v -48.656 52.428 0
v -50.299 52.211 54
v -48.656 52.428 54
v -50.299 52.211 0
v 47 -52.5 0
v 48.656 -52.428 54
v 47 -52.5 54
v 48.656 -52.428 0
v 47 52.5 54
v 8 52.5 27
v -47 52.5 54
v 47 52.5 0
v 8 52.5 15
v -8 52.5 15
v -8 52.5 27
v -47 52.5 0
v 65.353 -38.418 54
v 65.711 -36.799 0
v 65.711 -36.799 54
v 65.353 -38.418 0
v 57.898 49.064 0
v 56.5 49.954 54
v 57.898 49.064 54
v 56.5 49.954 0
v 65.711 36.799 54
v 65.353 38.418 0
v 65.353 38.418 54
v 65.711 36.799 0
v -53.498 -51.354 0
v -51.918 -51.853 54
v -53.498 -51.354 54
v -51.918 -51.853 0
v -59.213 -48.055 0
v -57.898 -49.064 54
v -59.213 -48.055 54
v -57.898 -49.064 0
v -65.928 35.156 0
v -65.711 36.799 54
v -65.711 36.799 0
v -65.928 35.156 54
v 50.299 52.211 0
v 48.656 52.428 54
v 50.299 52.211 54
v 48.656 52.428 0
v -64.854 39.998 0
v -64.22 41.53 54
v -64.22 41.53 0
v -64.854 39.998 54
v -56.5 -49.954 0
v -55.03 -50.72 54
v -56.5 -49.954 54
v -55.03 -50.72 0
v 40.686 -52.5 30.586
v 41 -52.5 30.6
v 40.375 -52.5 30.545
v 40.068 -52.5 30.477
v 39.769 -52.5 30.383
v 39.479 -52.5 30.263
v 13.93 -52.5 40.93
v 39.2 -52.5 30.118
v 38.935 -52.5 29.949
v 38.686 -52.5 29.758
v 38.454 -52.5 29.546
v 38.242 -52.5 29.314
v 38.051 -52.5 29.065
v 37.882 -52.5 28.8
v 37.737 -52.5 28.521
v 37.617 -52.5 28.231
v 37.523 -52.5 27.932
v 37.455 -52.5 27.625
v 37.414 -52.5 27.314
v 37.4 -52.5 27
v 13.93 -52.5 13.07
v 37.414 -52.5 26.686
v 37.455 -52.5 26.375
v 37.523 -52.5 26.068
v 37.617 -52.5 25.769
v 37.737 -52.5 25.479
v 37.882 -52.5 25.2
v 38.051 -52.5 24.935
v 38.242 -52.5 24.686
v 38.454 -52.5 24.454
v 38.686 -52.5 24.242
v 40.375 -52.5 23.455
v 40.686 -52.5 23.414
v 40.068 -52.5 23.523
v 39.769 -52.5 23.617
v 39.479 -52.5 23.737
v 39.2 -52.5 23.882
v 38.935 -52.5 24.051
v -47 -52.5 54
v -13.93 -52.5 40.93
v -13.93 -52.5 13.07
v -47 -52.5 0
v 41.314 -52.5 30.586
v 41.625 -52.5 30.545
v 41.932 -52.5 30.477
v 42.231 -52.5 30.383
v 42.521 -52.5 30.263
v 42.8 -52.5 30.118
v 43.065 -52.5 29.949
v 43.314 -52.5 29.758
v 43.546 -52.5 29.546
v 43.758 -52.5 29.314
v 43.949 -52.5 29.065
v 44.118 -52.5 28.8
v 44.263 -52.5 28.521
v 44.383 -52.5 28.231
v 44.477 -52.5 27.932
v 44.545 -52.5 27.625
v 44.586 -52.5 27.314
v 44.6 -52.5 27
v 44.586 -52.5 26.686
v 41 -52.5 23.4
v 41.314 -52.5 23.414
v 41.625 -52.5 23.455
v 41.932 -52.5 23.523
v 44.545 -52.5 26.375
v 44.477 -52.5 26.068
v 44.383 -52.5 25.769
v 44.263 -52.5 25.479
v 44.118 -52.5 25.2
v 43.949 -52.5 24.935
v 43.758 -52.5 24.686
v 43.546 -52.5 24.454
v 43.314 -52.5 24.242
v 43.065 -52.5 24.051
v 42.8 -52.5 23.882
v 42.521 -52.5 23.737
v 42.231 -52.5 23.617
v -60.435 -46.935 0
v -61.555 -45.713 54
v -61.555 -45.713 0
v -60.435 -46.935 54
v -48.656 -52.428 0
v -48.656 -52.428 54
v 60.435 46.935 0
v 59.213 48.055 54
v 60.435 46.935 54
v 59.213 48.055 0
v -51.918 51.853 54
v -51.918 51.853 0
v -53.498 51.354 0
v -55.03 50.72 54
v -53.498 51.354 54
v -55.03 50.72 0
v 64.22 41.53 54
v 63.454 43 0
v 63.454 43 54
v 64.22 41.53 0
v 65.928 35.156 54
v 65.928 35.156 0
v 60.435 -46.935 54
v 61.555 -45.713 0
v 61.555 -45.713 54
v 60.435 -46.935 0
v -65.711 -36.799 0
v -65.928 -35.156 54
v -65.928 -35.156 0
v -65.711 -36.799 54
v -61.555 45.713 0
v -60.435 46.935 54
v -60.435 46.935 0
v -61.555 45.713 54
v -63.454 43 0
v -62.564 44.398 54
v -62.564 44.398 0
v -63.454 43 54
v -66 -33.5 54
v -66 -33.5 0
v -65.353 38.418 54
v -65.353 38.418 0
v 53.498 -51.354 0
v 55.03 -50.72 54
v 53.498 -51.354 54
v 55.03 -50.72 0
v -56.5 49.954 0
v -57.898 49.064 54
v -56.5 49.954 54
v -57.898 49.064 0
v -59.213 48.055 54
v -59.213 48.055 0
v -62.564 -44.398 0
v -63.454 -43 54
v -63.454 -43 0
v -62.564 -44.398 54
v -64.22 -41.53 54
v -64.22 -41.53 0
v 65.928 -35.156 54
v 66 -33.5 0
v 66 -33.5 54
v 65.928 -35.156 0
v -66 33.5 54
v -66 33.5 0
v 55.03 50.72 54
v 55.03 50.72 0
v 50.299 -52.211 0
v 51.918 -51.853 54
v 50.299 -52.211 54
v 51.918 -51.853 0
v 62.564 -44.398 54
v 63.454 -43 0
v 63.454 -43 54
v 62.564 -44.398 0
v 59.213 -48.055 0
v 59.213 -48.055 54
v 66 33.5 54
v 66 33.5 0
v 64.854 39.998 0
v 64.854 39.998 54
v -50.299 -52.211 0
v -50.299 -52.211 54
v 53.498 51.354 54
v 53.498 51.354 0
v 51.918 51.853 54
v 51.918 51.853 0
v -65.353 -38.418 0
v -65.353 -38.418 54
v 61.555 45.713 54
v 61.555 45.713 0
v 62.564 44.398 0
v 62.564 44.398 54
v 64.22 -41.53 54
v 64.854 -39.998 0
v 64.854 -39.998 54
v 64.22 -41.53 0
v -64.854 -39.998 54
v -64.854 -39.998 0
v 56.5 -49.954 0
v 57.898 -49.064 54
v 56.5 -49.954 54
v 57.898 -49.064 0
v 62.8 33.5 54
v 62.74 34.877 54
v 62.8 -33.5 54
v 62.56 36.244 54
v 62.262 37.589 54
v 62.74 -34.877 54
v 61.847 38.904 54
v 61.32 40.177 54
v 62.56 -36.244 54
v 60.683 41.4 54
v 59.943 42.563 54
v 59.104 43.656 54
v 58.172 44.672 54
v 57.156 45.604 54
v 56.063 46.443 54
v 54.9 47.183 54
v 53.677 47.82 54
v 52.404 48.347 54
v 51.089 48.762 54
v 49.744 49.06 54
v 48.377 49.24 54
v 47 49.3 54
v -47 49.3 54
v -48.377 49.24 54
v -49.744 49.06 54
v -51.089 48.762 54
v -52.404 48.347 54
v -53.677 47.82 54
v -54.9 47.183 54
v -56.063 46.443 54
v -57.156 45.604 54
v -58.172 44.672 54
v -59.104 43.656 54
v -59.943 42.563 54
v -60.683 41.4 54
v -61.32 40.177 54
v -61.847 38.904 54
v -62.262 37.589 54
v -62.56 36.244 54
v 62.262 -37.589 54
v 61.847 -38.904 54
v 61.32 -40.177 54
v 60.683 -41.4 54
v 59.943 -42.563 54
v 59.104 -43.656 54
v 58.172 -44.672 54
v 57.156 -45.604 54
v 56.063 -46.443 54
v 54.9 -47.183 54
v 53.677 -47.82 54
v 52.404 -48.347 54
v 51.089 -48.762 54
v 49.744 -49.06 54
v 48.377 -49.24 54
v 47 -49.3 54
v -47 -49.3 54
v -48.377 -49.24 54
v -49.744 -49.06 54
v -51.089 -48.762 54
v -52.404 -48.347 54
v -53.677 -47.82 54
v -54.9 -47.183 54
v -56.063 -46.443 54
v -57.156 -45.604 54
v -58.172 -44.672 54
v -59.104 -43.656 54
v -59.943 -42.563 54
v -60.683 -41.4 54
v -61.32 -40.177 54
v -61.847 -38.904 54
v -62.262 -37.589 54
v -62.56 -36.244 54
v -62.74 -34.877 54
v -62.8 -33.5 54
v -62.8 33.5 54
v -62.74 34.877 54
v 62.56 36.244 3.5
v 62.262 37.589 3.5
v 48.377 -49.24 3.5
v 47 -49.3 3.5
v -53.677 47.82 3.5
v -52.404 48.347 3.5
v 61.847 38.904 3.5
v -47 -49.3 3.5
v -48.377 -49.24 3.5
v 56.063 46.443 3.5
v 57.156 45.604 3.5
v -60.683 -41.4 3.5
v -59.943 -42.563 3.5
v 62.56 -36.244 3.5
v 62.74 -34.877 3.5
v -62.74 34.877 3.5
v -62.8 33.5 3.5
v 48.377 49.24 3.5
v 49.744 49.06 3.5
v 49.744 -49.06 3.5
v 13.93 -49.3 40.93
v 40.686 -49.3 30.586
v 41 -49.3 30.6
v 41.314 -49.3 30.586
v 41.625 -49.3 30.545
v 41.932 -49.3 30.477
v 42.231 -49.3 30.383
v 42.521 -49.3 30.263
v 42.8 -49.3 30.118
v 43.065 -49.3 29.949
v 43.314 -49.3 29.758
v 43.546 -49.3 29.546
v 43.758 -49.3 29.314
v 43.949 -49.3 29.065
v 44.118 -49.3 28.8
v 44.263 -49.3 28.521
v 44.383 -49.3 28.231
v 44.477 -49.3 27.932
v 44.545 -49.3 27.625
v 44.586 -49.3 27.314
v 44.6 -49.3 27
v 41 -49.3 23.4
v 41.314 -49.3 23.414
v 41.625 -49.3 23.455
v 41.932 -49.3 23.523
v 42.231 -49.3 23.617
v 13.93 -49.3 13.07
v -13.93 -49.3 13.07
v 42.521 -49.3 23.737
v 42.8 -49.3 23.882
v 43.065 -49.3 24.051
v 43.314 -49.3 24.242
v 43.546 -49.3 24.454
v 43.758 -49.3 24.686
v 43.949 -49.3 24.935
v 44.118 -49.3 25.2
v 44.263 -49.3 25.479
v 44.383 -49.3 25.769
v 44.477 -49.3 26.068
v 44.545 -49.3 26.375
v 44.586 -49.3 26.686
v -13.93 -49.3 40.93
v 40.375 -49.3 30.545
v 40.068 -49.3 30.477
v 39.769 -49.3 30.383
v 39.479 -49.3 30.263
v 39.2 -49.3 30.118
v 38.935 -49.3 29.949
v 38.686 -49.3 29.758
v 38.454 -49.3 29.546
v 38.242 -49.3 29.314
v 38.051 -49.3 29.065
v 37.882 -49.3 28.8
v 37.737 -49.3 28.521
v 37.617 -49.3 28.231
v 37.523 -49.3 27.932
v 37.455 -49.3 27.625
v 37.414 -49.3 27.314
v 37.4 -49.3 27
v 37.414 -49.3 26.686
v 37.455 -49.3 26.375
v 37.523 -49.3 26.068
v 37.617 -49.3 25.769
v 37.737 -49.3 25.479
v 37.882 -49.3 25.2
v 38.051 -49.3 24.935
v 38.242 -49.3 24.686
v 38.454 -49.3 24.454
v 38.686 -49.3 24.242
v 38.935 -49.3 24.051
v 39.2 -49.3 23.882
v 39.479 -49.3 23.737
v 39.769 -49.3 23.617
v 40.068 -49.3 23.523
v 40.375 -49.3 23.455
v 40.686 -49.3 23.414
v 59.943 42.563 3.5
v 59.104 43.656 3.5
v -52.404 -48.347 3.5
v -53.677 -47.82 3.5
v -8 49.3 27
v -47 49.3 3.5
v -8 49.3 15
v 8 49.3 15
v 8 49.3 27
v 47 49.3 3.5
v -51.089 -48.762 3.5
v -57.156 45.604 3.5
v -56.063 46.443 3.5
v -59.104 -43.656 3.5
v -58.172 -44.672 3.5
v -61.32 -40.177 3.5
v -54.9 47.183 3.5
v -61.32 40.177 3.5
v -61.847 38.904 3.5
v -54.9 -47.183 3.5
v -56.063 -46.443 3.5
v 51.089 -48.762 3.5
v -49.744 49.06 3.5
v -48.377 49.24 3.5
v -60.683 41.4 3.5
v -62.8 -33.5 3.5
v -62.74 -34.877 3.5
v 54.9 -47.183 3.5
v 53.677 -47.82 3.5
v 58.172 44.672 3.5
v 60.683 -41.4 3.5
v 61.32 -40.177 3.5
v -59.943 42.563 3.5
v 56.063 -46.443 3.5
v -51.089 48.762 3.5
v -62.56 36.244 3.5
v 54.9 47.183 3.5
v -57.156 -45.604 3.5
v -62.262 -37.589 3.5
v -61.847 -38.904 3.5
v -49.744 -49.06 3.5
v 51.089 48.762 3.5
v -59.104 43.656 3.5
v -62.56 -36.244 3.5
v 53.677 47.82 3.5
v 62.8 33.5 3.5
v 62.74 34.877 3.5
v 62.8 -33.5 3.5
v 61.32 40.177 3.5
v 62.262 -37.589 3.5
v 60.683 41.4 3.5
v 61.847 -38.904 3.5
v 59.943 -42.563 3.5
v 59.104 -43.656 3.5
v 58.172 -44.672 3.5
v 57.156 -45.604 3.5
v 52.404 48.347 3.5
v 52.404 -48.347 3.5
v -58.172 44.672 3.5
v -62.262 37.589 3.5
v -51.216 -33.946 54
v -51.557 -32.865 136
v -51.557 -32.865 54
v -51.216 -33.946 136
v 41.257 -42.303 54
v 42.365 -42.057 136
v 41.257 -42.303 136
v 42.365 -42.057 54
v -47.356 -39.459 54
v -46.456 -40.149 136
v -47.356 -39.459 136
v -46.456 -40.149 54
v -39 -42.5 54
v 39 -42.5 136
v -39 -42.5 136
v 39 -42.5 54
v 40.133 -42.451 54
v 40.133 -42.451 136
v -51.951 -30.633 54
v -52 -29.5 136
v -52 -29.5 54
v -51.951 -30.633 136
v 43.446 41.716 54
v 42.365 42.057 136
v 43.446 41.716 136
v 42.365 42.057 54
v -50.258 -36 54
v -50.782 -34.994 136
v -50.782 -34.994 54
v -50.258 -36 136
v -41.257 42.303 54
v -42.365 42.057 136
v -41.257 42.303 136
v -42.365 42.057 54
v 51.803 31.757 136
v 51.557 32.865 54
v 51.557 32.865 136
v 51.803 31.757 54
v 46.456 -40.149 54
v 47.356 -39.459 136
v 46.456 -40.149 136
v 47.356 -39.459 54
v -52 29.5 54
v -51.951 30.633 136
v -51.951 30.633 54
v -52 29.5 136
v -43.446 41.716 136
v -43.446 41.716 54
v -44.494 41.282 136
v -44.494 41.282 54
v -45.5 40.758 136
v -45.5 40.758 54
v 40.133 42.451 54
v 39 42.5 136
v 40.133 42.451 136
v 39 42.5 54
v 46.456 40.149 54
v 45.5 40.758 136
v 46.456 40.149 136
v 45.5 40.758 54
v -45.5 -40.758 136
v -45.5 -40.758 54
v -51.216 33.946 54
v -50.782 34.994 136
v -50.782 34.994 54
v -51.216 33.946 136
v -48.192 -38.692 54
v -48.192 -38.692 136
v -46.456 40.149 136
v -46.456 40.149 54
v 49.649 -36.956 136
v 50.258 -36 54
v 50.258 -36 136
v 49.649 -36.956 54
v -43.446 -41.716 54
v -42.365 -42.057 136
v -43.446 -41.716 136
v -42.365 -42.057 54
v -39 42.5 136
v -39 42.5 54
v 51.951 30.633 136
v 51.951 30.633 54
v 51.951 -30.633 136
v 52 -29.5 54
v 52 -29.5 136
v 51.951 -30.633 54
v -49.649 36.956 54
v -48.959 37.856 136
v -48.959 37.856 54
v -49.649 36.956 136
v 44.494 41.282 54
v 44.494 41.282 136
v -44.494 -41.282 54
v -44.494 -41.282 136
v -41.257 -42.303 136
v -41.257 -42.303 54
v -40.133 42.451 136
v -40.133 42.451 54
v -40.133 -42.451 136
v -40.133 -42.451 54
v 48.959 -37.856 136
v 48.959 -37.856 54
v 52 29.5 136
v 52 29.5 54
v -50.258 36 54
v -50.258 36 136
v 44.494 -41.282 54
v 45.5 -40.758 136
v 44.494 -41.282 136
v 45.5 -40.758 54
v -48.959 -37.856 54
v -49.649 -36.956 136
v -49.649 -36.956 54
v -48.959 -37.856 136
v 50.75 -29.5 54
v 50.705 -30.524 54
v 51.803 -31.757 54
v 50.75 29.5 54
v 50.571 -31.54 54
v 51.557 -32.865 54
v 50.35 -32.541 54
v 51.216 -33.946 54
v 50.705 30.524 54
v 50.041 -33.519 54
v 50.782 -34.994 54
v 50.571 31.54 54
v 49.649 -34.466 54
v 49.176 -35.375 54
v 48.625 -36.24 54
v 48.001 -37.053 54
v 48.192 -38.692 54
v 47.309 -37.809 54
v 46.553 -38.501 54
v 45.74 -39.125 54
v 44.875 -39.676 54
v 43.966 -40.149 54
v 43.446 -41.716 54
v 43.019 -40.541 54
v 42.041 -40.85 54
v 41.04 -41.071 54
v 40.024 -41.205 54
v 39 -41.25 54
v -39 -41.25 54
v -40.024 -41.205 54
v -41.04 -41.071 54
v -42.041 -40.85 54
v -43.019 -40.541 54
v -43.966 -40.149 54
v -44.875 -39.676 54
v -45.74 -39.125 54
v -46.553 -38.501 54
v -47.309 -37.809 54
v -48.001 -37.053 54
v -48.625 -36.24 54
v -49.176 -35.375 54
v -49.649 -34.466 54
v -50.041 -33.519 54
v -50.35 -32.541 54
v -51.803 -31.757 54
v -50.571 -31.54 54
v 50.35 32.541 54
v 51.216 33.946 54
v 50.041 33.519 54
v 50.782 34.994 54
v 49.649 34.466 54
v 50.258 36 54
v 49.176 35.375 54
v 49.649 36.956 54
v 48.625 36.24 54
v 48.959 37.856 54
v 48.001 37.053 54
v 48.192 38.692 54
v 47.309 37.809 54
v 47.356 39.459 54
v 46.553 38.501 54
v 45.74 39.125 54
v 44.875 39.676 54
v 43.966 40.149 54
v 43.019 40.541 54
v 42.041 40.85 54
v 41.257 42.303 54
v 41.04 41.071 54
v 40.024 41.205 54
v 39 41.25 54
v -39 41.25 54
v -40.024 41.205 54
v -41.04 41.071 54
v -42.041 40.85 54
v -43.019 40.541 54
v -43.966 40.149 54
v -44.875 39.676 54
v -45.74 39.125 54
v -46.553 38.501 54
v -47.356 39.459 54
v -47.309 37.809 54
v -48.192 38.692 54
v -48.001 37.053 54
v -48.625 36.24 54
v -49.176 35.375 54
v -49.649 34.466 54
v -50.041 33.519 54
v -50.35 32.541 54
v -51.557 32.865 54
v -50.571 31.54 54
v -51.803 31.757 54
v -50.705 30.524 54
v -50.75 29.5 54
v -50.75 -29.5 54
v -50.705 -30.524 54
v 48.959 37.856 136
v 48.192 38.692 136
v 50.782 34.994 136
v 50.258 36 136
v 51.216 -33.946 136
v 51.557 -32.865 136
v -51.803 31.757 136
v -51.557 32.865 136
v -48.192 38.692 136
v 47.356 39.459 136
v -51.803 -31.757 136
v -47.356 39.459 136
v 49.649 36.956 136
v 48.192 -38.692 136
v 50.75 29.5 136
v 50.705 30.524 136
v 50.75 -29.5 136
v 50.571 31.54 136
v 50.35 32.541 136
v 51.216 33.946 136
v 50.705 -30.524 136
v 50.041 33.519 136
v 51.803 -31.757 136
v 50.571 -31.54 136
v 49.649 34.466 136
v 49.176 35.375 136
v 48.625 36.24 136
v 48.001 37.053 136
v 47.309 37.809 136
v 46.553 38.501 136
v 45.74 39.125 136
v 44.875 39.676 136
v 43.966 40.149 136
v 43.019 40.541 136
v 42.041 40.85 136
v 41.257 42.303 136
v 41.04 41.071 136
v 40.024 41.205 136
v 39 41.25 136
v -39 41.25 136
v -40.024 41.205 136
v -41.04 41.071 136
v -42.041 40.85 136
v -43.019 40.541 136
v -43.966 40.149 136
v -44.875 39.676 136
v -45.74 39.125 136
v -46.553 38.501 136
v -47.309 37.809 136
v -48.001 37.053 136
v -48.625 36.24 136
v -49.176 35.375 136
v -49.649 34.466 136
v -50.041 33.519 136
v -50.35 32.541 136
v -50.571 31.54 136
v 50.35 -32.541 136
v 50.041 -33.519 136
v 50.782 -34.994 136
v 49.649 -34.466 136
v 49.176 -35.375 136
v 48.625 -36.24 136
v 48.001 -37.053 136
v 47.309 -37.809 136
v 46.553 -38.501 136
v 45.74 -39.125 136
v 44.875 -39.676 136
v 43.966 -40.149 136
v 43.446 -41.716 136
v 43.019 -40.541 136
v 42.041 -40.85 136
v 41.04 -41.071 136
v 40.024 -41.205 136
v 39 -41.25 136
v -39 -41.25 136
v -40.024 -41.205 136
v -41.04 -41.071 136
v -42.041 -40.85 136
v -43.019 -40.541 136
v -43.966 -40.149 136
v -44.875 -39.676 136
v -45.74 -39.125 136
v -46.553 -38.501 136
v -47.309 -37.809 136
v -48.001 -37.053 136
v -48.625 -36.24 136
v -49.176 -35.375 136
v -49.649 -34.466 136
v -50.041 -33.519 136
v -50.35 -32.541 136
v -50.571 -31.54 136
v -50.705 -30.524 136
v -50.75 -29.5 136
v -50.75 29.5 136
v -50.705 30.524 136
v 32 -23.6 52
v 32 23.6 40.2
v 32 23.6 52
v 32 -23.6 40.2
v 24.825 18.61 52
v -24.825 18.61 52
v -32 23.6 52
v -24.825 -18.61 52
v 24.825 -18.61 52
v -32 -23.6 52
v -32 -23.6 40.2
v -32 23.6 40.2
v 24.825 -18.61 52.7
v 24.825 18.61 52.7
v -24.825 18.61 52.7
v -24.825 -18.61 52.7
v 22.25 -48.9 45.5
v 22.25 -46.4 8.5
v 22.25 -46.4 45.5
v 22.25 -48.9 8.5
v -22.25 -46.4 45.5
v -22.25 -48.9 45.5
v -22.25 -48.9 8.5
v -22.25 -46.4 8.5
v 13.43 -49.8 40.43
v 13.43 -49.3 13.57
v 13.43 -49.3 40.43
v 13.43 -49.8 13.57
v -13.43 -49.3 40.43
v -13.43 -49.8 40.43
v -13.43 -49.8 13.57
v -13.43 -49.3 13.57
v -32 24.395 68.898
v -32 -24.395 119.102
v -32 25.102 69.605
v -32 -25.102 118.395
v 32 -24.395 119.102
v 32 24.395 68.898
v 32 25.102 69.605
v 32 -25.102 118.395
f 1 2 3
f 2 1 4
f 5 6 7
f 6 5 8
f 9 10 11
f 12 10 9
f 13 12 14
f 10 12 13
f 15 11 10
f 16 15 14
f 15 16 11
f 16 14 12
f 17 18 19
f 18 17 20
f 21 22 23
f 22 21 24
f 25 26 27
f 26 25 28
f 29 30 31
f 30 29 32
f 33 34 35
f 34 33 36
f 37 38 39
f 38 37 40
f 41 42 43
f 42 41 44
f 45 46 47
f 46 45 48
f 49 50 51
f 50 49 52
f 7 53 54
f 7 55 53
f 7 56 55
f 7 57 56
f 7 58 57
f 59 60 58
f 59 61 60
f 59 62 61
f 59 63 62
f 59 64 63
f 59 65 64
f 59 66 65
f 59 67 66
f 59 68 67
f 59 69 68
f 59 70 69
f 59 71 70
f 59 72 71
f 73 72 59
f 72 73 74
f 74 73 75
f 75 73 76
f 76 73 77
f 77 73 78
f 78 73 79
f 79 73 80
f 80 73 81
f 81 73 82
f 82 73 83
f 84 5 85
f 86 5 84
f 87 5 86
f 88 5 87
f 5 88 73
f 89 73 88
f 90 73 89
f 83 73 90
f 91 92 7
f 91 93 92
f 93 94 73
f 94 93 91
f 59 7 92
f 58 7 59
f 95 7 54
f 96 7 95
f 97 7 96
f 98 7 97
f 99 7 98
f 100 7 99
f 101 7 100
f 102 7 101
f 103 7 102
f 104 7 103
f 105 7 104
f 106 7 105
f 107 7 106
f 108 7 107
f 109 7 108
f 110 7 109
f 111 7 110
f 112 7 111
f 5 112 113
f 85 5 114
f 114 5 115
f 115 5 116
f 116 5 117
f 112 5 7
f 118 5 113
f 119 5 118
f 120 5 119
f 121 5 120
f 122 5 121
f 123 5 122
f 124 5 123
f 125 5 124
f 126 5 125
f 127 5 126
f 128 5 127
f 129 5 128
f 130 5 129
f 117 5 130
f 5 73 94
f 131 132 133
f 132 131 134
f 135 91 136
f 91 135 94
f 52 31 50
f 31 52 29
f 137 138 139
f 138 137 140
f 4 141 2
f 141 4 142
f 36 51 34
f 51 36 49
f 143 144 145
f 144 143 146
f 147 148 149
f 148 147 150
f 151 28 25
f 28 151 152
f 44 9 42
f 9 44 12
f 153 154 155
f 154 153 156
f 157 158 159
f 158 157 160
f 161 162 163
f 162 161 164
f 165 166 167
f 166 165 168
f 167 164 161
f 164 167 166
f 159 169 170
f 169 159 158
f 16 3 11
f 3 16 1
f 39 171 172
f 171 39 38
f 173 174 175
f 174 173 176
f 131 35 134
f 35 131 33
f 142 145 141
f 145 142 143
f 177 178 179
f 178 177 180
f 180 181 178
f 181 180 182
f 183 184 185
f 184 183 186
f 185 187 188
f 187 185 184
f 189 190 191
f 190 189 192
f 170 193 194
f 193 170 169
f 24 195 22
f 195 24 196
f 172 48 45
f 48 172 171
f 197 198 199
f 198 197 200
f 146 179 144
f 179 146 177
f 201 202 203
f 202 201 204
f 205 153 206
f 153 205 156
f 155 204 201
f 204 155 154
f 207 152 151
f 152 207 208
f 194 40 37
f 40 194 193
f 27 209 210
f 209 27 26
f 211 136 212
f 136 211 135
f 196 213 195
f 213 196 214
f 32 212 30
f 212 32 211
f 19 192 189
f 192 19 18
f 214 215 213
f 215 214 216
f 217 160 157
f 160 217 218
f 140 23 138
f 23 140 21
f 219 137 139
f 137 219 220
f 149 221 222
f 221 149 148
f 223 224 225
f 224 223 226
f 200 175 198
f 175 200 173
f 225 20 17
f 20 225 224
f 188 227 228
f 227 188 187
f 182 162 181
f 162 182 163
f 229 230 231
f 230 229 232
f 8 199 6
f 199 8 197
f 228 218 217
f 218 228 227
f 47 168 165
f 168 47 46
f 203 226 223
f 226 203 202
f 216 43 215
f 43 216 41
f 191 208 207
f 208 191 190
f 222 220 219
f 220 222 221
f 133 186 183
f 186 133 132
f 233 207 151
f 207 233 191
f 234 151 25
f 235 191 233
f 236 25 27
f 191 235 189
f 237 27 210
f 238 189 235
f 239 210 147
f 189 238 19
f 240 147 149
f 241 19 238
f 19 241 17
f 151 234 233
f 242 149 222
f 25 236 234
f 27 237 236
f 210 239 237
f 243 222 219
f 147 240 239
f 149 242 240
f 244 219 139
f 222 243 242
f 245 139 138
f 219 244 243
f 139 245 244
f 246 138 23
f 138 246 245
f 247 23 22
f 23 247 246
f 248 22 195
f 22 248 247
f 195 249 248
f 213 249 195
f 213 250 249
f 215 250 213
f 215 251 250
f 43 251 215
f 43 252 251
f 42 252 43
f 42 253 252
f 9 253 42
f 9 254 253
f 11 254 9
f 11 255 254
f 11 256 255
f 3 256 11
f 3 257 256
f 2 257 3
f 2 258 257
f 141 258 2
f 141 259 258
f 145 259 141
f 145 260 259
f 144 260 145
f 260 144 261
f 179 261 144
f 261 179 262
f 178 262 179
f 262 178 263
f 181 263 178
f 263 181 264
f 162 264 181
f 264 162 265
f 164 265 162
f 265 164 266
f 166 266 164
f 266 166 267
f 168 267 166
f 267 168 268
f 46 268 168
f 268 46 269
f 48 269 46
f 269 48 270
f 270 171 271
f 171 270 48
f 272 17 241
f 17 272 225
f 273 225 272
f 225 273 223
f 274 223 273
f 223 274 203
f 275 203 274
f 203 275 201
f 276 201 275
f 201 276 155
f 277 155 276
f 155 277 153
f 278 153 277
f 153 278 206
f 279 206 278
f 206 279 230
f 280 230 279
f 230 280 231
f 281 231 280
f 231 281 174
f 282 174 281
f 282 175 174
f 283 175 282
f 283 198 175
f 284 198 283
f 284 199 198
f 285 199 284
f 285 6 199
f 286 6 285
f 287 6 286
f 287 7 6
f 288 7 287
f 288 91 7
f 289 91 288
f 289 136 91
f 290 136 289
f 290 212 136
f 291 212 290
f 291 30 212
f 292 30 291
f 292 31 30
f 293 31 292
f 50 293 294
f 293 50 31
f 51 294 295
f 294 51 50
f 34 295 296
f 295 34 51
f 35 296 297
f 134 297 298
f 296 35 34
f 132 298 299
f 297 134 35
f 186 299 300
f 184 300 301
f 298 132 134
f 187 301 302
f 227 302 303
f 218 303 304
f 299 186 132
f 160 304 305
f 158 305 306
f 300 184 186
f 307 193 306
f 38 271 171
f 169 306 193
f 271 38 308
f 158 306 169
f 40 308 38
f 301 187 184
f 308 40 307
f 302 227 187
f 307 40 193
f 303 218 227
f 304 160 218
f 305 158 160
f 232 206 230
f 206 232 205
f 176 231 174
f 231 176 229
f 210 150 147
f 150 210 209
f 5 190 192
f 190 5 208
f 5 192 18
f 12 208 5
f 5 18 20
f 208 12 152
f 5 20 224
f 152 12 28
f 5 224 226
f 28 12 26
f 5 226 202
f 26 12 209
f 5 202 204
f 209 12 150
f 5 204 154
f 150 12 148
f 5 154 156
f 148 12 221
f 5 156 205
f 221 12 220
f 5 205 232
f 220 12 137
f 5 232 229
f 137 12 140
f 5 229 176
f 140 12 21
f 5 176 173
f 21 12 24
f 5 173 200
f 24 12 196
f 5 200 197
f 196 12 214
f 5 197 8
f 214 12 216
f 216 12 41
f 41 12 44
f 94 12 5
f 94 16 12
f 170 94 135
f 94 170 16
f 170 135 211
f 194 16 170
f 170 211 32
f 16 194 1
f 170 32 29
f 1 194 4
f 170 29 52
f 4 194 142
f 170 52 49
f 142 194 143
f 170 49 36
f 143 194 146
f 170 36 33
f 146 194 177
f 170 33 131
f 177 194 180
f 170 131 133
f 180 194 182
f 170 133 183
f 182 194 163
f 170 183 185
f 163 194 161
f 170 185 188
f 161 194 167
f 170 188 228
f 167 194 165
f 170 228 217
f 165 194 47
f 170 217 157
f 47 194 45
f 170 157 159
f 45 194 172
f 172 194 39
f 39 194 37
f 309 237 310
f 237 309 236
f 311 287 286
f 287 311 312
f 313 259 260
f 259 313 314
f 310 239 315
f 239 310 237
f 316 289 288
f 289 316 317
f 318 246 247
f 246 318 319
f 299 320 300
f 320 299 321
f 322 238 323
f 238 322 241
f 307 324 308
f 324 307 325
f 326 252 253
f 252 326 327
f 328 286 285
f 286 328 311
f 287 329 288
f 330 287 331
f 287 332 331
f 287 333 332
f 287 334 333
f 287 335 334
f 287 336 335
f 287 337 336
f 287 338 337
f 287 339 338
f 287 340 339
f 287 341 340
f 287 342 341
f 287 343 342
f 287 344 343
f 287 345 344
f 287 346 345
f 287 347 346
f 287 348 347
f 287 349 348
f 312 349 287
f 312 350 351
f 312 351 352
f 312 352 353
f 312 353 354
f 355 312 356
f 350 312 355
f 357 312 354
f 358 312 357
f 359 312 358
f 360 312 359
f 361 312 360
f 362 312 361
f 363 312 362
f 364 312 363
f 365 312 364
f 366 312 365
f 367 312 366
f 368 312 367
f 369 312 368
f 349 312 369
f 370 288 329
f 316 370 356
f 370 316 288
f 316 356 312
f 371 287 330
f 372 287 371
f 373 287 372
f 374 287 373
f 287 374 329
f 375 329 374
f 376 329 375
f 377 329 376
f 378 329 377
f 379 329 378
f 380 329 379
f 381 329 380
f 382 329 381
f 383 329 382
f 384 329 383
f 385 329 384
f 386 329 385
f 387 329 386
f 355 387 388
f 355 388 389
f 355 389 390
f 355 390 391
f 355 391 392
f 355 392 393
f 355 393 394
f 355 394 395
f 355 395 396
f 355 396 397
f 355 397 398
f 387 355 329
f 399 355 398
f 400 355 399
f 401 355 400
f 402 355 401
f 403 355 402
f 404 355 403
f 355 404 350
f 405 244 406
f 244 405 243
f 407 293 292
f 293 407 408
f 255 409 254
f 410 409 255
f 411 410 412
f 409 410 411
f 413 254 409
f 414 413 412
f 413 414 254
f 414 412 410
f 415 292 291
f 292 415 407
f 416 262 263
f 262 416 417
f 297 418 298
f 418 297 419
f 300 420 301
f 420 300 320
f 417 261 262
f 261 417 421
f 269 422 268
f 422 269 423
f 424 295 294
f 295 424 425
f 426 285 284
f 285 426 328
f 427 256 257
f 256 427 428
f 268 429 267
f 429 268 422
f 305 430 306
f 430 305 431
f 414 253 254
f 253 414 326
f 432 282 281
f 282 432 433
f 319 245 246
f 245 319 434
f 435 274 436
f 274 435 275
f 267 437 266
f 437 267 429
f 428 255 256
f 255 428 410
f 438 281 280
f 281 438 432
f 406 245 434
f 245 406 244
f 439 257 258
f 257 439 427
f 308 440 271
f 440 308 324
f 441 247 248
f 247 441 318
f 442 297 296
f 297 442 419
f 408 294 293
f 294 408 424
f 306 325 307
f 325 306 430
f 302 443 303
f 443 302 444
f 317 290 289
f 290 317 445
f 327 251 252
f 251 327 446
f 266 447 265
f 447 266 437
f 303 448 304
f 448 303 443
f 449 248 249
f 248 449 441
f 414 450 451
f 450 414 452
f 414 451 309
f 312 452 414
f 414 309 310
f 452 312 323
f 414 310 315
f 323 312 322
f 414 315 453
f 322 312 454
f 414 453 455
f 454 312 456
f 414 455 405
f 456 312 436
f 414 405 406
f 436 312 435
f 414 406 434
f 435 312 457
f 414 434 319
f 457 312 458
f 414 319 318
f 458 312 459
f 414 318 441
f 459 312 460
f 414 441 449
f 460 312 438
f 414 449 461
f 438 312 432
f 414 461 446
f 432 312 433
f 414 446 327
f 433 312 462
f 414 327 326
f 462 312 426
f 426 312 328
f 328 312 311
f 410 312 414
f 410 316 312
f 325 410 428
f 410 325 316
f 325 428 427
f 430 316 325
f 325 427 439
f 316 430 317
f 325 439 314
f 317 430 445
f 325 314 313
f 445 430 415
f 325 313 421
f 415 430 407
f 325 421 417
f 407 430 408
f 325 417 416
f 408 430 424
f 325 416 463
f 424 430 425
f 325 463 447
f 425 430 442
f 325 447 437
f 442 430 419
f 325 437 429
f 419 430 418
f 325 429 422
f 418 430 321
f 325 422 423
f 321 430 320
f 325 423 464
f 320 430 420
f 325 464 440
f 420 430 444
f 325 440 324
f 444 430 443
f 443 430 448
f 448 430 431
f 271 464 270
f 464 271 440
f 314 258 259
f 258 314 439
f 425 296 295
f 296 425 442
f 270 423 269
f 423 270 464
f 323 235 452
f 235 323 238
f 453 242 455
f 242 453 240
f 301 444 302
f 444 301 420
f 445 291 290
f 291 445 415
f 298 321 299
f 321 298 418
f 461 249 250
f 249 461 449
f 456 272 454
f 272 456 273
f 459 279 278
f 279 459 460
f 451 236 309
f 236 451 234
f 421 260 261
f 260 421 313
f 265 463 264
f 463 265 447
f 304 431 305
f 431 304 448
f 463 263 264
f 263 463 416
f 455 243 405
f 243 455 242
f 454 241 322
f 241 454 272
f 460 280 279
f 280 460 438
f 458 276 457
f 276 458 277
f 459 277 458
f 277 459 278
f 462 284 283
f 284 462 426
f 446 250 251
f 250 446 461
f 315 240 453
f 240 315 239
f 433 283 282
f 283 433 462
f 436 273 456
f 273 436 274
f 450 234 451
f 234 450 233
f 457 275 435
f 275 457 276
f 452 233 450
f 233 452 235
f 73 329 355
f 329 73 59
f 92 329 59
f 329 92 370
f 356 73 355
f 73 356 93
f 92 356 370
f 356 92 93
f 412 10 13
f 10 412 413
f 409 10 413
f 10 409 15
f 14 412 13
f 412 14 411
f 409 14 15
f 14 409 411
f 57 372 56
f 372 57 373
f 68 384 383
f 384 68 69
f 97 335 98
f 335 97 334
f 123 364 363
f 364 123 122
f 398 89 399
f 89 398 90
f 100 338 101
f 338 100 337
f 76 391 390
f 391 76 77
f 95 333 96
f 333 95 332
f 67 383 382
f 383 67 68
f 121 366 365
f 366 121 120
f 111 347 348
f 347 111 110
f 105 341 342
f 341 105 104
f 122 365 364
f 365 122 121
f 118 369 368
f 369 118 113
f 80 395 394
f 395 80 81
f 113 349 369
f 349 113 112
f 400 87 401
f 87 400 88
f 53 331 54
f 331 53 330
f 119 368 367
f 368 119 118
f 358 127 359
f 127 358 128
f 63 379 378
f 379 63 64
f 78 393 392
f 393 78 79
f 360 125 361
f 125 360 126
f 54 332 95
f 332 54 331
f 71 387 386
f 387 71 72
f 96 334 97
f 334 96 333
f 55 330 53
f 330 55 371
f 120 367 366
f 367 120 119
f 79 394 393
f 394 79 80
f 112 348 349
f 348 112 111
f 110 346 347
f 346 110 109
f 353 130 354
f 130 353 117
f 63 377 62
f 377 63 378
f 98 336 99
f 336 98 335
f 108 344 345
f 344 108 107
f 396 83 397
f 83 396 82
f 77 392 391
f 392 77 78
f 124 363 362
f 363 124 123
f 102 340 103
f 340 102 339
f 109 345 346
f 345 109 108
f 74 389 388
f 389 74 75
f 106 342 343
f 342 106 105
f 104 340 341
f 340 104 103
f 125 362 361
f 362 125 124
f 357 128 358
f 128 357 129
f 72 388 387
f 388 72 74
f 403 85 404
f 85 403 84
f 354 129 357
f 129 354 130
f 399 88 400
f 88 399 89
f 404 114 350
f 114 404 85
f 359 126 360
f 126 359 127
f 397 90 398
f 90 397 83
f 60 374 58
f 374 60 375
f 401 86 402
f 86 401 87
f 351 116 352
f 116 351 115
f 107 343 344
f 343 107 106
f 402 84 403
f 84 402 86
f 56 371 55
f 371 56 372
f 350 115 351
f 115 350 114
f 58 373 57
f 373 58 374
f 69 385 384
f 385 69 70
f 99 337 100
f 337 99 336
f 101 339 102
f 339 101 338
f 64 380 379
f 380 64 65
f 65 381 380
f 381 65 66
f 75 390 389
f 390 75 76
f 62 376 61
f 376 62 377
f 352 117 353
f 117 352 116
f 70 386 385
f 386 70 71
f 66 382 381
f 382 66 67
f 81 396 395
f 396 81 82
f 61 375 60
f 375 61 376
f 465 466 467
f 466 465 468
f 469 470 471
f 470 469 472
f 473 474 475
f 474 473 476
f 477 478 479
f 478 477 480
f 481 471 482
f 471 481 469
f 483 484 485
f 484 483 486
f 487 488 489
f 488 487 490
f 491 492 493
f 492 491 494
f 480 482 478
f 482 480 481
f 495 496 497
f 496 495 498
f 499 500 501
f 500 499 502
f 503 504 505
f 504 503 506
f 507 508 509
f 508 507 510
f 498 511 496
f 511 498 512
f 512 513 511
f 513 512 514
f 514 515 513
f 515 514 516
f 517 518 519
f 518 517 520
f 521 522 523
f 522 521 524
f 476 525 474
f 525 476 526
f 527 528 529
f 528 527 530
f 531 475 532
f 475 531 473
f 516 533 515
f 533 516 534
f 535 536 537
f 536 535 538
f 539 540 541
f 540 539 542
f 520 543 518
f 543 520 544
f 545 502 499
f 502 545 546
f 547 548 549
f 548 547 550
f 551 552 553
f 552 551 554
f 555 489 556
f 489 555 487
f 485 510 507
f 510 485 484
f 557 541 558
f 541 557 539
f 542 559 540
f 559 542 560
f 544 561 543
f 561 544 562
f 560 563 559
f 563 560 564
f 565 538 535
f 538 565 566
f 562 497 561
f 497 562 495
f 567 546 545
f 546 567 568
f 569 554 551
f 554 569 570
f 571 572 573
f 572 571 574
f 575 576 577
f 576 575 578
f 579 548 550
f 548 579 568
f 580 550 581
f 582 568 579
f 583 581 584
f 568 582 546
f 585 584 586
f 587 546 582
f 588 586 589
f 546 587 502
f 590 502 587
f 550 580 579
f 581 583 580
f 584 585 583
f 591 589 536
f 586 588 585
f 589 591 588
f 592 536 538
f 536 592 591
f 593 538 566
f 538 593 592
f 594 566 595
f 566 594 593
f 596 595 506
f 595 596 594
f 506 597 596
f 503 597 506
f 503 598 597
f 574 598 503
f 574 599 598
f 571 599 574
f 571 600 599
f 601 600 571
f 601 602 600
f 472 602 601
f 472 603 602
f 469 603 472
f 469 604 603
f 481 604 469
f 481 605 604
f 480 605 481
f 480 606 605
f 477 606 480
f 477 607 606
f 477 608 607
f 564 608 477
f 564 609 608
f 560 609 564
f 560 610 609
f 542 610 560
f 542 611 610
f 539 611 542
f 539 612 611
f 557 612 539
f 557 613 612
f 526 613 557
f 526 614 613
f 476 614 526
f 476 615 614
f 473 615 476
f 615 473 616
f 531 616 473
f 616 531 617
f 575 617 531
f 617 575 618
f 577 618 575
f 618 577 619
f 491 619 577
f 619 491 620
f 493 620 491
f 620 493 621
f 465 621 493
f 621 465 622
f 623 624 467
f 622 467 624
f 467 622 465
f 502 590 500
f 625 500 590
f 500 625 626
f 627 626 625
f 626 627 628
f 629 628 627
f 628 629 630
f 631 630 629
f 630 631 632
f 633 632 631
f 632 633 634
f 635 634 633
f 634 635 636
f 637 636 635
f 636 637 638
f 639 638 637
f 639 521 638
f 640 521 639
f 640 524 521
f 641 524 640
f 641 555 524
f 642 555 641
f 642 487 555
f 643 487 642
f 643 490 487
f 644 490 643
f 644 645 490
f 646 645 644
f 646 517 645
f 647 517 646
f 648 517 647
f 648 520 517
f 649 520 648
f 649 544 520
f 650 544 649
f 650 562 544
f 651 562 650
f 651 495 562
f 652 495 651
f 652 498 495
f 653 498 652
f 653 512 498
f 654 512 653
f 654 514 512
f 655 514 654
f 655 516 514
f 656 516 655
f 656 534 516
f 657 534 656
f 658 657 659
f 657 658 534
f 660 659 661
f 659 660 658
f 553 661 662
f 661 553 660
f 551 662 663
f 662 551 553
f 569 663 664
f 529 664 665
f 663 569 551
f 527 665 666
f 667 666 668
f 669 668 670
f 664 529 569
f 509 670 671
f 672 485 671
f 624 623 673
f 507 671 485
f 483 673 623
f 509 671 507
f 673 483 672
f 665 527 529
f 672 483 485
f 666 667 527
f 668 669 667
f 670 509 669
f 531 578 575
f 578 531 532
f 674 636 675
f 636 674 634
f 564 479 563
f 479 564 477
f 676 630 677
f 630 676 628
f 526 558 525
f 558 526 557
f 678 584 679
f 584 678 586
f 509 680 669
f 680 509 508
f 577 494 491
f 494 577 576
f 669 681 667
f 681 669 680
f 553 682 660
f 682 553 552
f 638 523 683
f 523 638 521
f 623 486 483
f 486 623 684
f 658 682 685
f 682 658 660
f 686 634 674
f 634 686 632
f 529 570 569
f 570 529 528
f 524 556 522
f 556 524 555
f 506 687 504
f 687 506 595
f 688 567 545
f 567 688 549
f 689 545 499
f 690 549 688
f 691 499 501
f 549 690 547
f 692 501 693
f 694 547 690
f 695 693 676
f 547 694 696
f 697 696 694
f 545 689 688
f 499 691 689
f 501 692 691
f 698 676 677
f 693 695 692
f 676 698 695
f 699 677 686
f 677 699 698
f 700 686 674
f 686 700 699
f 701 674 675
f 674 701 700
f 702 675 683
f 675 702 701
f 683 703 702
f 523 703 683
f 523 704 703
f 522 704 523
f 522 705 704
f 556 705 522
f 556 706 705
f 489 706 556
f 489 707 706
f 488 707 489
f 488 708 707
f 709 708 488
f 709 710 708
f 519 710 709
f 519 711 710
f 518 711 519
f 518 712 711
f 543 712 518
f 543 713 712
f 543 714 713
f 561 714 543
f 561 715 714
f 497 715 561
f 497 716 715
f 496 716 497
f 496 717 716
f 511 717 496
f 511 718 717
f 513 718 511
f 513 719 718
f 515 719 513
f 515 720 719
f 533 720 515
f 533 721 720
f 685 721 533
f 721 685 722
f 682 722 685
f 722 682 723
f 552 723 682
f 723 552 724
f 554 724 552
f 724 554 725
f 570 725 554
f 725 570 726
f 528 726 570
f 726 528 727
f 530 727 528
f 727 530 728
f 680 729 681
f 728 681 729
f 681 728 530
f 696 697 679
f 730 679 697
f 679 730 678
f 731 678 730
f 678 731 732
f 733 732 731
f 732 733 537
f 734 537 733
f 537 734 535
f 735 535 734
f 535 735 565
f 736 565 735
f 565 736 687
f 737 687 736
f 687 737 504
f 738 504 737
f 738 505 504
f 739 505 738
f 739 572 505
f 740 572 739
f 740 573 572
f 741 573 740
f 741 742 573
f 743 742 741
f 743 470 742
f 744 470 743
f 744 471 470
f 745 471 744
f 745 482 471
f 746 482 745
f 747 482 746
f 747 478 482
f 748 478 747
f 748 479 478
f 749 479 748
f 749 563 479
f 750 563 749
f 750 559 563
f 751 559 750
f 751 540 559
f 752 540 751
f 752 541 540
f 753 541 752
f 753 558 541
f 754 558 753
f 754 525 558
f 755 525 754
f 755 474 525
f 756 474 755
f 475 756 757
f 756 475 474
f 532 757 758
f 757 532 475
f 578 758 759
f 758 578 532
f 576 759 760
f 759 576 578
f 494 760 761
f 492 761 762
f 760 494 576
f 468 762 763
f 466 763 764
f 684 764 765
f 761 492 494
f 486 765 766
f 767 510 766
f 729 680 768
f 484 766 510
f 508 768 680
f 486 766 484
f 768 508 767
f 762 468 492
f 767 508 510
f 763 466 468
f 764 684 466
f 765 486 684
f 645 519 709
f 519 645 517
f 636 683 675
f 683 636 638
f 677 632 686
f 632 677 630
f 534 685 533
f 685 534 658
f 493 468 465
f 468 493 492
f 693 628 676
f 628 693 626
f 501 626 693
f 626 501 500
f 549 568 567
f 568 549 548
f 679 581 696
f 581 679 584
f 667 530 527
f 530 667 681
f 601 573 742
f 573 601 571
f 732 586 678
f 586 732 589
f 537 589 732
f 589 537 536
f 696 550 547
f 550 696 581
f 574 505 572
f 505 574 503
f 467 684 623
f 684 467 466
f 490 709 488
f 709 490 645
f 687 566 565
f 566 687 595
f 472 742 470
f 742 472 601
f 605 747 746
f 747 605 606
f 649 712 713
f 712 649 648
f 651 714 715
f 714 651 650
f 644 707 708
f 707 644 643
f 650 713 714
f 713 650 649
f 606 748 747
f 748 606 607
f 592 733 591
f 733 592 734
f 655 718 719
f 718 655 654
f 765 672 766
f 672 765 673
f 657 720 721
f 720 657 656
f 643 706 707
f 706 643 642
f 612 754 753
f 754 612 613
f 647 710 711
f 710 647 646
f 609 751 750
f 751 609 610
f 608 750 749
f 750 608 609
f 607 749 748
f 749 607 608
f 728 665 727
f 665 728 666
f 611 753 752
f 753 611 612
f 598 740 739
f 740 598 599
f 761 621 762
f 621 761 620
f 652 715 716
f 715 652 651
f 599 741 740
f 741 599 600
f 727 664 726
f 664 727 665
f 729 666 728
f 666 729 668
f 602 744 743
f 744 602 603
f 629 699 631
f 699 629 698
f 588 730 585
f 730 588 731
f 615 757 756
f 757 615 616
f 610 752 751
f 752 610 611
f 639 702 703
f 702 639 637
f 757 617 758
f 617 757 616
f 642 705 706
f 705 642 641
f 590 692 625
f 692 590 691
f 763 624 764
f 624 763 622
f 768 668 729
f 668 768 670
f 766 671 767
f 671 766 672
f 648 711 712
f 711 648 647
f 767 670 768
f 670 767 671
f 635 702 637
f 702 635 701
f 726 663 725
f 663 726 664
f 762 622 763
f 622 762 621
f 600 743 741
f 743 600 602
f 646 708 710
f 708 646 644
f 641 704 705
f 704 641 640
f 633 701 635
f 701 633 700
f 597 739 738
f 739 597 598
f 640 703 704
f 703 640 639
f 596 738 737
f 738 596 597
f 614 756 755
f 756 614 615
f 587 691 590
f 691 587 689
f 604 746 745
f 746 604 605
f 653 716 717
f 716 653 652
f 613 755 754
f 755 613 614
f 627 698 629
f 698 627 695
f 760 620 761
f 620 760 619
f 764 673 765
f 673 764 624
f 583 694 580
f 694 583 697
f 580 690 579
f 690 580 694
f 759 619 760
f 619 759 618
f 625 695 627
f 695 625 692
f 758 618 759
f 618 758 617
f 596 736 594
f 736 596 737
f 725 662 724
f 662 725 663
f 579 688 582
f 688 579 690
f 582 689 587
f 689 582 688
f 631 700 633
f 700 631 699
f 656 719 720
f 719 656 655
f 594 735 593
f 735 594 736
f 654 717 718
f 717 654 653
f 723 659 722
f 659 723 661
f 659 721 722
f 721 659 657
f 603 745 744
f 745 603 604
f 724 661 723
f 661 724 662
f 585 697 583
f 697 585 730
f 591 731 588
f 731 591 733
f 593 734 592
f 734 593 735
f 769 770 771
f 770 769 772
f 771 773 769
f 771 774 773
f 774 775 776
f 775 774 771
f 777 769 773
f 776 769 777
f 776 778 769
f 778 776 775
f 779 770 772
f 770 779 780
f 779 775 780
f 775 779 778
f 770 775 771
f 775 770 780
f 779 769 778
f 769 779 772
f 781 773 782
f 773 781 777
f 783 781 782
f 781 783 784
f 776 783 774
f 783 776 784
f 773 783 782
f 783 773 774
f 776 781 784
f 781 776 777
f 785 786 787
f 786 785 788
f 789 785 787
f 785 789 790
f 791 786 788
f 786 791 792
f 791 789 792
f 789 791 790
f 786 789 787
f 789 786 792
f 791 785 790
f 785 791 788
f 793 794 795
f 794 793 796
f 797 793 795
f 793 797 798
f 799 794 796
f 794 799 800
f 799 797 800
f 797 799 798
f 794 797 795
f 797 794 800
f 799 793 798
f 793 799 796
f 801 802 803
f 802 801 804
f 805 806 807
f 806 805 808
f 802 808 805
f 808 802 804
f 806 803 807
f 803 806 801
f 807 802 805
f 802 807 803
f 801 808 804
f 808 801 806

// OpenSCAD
// PokéDock Ghost Companion V16 Rev B. Measured module ENVELOPES; not print-qualified mounting.
// Manufacturer: AMOLED 2.41 WITHOUT case PCB 47.2x64.0x11.8mm;
// Waveshare 1.5 SSD1327 OLED PCB 44.5x37.0mm, active square 26.86mm.
// MODE "base" exports one watertight prototype shell; "assembly" for inspection.
$fn=72;
MODE="assembly";
W=132;D=105;H=54;CORNER=19;WALL=3.2;FLOOR=3.5;
AMOLED_W=64;AMOLED_D=47.2;AMOLED_T=11.8;
OLED_PCB_W=44.5;OLED_PCB_H=37.0;OLED_ACTIVE=26.86;
CH_W=104;CH_D=85;CH_H=82;CH_R=13;
PLATE_W=64;PLATE_LEN=70;PLATE_T=1;
ENCODER_HOLE_D=7.2; // MUST verify actual encoder mechanical drawing
module rounded2D(w,d,r){offset(r=r)square([w-2*r,d-2*r],center=true);}
module base(){
 difference(){
  linear_extrude(height=H)rounded2D(W,D,CORNER);
  translate([0,0,FLOOR])linear_extrude(height=H+1)rounded2D(W-2*WALL,D-2*WALL,CORNER-WALL);
  // Aperture fits 26.86x26.86 ACTIVE pixels; PCB goes behind it.
  translate([-OLED_ACTIVE/2-.5,-D/2-1,H/2-OLED_ACTIVE/2-.5])
   cube([OLED_ACTIVE+1,6,OLED_ACTIVE+1]);
  // Rear USB service notch is a PLACEHOLDER, board orientation pending.
  translate([-8,D/2-WALL-2,15])cube([16,7,12]);
  // Encoder shaft hole only; board mounting bracket unverified.
  translate([41,-D/2-1,H/2])rotate([-90,0,0])cylinder(h=8,d=ENCODER_HOLE_D);
 }
}
module amoled_envelope(){
 color([.14,.14,.18])translate([-AMOLED_W/2,-AMOLED_D/2,H-AMOLED_T-2])
  cube([AMOLED_W,AMOLED_D,AMOLED_T]);
 color([.20,.08,.28])translate([-49.65/2,-37.22/2,H-2.1])cube([49.65,37.22,.8]);
}
module oled_envelope(){
 color([.1,.1,.13])translate([-OLED_PCB_W/2,-D/2+WALL+.4,H/2-OLED_PCB_H/2])
  cube([OLED_PCB_W,2.5,OLED_PCB_H]);
 color([.34,.19,.45])translate([-OLED_ACTIVE/2,-D/2+WALL-.5,H/2-OLED_ACTIVE/2])
  cube([OLED_ACTIVE,.5,OLED_ACTIVE]);
}
module chamber(){
 color([.83,.74,.98,.16])translate([0,0,H+CH_H/2])
 difference(){
  linear_extrude(height=CH_H,center=true)rounded2D(CH_W,CH_D,CH_R);
  linear_extrude(height=CH_H+2,center=true)rounded2D(CH_W-2.5,CH_D-2.5,CH_R-1.25);
 }
}
module reflector(){
 // 70mm @ 45deg gives approx +/-24.75mm in Y and Z; fits 85mm depth.
 color([.65,.84,1,.33])
 translate([0,0,H+40])rotate([45,0,0])cube([PLATE_W,PLATE_T,PLATE_LEN],center=true);
}
if(MODE=="base")color([.95,.91,.86])base();
else if(MODE=="assembly"){
 color([.95,.91,.86])base();
 chamber();reflector();amoled_envelope();oled_envelope();
}
else if(MODE=="envelope"){amoled_envelope();oled_envelope();reflector();}
else assert(false,str("Unknown MODE:",MODE));
